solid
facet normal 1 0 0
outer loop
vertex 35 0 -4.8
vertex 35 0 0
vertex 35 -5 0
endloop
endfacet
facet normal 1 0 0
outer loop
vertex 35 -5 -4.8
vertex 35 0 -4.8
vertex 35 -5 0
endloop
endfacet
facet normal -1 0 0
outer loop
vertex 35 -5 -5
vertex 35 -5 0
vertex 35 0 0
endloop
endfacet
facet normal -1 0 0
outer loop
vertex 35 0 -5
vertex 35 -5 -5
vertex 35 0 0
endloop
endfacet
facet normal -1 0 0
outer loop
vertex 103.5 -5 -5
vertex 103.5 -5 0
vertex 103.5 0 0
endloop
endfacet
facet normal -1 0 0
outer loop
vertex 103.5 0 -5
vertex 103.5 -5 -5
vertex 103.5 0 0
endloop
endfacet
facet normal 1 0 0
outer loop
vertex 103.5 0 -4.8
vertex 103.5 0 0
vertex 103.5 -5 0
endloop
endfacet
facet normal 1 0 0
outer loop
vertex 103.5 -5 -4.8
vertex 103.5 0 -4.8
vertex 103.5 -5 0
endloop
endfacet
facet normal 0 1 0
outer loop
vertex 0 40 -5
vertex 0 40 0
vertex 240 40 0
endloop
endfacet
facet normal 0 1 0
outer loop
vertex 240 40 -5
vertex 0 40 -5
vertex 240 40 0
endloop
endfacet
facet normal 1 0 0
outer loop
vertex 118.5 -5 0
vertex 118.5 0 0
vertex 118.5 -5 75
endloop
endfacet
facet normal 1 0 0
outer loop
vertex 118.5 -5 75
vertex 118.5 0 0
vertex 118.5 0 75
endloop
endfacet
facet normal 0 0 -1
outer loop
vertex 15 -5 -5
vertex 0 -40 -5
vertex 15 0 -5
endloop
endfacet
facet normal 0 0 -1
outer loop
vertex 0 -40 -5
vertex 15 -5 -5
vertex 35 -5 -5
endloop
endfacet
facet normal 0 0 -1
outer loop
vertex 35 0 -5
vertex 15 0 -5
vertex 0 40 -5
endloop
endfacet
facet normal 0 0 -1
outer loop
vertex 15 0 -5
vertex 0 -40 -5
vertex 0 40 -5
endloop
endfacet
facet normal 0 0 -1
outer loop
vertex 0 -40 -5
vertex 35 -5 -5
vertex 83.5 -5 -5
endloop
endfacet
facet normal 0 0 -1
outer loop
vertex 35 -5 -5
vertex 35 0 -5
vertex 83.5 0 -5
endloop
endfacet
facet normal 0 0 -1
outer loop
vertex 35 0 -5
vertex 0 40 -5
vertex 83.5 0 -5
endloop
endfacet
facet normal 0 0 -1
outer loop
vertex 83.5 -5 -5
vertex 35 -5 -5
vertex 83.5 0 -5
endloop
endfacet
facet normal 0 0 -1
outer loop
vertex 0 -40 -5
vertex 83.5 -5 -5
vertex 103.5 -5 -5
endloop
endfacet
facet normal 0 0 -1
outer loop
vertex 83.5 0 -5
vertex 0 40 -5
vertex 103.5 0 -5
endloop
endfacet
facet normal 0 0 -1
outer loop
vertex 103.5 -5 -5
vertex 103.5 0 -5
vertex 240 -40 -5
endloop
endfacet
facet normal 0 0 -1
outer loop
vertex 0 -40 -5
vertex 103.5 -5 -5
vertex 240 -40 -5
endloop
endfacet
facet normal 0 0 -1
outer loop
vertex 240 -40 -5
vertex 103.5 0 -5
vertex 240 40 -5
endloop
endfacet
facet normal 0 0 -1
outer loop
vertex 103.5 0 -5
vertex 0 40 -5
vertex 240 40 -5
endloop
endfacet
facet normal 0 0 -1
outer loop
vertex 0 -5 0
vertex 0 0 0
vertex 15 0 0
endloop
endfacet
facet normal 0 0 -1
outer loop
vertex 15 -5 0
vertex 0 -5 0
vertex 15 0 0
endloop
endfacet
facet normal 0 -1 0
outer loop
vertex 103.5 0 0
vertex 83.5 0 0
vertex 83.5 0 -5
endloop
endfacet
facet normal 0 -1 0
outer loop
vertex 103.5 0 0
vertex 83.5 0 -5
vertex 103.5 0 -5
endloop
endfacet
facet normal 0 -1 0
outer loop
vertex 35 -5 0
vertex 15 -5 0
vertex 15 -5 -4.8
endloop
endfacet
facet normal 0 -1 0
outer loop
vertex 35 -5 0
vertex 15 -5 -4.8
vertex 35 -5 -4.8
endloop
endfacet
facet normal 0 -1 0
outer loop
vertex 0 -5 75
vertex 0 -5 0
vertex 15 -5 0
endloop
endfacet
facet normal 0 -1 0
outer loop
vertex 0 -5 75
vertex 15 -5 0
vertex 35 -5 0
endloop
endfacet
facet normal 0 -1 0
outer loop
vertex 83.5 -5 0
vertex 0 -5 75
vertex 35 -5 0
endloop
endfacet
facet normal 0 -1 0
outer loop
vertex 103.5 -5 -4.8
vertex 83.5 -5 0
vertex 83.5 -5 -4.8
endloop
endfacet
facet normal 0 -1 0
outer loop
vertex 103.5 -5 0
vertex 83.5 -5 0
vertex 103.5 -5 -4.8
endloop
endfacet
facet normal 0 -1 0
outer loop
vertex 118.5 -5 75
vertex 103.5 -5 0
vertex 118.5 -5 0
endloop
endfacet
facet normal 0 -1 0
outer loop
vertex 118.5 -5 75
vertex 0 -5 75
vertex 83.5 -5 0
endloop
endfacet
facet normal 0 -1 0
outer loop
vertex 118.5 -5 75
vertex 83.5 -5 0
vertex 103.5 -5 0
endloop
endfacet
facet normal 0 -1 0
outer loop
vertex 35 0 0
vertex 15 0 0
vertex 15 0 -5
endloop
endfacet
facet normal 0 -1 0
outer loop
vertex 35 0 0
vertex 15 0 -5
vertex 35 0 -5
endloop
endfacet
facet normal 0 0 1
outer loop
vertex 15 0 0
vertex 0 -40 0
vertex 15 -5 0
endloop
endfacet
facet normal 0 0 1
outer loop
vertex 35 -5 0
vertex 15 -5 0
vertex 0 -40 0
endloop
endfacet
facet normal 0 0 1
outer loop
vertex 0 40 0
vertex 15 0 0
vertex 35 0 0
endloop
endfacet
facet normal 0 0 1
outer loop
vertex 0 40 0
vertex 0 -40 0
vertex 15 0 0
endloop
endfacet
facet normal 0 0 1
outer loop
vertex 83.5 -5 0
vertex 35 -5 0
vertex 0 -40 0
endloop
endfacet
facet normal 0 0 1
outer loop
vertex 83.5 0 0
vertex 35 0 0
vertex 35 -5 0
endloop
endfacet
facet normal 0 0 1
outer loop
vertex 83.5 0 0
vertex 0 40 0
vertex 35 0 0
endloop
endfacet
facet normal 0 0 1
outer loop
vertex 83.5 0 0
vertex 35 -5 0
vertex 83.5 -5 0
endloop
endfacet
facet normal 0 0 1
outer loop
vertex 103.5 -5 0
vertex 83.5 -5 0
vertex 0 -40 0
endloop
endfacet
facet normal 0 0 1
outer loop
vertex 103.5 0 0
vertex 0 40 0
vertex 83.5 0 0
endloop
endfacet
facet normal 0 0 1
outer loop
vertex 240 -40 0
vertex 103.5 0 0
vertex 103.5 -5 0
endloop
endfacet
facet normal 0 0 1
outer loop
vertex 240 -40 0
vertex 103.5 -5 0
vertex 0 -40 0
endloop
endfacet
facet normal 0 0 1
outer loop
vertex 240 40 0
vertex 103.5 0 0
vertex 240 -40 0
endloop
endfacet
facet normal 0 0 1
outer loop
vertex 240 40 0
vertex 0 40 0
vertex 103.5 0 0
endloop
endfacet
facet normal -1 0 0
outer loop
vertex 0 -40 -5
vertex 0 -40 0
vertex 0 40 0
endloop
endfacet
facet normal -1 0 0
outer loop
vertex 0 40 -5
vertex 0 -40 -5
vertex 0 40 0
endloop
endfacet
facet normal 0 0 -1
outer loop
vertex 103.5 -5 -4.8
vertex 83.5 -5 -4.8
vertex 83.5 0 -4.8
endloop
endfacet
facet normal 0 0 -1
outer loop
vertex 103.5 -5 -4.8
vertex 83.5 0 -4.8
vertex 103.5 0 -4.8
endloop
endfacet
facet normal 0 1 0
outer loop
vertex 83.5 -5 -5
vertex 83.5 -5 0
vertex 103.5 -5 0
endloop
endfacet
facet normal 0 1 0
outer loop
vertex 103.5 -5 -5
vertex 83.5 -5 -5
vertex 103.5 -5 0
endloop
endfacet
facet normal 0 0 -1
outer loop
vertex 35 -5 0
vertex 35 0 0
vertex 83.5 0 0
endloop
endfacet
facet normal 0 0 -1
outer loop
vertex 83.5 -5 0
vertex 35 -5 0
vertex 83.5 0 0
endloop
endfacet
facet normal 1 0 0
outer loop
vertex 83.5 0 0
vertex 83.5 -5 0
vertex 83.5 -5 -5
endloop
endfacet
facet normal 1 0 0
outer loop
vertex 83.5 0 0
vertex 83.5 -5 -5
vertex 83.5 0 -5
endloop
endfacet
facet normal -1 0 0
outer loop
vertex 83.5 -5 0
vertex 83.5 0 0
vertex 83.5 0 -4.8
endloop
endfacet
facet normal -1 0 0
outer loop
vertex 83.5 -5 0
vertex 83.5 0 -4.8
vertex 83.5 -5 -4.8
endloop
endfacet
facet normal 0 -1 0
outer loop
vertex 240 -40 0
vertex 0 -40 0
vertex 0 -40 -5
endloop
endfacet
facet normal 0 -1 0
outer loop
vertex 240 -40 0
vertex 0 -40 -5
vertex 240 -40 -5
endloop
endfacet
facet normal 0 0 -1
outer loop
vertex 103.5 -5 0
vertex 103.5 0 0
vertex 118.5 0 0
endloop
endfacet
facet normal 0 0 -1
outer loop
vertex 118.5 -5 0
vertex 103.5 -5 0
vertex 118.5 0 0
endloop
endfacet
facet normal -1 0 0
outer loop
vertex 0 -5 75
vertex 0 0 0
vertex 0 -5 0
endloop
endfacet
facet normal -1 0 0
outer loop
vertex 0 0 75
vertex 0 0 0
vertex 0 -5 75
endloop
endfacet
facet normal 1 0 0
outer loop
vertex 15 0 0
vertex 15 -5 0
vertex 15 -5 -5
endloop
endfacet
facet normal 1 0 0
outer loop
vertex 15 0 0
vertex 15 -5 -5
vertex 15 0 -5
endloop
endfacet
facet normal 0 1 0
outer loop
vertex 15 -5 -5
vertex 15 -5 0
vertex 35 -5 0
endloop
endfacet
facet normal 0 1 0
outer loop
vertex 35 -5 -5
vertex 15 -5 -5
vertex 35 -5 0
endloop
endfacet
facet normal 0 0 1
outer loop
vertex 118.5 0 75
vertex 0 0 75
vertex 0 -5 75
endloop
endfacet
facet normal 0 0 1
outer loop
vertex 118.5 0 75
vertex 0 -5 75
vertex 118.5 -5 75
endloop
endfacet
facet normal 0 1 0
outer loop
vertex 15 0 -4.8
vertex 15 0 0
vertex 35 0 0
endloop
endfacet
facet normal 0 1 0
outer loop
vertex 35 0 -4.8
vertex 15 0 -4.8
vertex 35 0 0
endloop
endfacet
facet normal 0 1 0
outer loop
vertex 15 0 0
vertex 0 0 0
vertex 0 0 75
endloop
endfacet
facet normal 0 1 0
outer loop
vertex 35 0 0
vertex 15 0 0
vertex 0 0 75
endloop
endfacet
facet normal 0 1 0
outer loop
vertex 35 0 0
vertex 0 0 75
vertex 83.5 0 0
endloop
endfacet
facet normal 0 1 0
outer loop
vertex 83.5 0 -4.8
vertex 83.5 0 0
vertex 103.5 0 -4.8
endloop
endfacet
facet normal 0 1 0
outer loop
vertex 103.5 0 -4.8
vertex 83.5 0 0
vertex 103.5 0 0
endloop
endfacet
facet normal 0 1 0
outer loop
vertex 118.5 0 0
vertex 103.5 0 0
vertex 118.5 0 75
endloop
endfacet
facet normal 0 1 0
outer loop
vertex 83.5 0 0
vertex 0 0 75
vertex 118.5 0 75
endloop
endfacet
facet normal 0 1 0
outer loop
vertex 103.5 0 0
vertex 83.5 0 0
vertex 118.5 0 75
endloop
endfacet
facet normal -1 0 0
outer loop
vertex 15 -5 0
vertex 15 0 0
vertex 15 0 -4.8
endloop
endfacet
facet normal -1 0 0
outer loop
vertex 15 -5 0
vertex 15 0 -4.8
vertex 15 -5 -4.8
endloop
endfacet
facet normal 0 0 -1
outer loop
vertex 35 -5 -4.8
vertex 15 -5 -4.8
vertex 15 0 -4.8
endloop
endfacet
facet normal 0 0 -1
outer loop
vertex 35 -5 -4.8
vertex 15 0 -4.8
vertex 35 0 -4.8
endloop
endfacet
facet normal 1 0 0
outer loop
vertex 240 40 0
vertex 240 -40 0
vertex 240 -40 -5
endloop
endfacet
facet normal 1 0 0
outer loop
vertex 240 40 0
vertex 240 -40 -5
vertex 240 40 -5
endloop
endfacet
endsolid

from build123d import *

# Parameters (mm, degrees)
SKETCH_W      = 118.5
SKETCH_H      = 75
PAD_DEPTH     = 5
SKETCH001_W   = 20
SKETCH001_H   = 5
PAD001_DEPTH  = 4.8
SKETCH002_W   = 240
SKETCH002_H   = 80
SKETCH002_W_2 = 20
SKETCH002_H_2 = 5
PAD002_DEPTH  = 5


with BuildPart() as body:
    # Sketch → Pad (new body)
    with BuildSketch(Plane.XZ):
        with Locations((59.25, 37.5)):
            Rectangle(SKETCH_W, SKETCH_H)
    extrude(amount=PAD_DEPTH)

    # Sketch001 (on Face1 of Pad) → Pad001 (join)
    with BuildSketch(Plane(origin=(0, 0, 0), x_dir=(1, 0, 0), z_dir=(0, 0, -1))):
        with Locations((25, 2.5)):
            Rectangle(SKETCH001_W, SKETCH001_H)
        with Locations((93.5, 2.5)):
            Rectangle(SKETCH001_W, SKETCH001_H)
    extrude(amount=PAD001_DEPTH)


with BuildPart() as body001:
    # Sketch002 → Pad002 (new body)
    with BuildSketch(Plane.XY):
        with Locations((120, 0)):
            Rectangle(SKETCH002_W, SKETCH002_H)
        with Locations((25, -2.5)):
            Rectangle(SKETCH002_W_2, SKETCH002_H_2, mode=Mode.SUBTRACT)
        with Locations((93.5, -2.5)):
            Rectangle(SKETCH002_W_2, SKETCH002_H_2, mode=Mode.SUBTRACT)
    extrude(amount=-PAD002_DEPTH)


solid = Compound([body.part, body001.part])
